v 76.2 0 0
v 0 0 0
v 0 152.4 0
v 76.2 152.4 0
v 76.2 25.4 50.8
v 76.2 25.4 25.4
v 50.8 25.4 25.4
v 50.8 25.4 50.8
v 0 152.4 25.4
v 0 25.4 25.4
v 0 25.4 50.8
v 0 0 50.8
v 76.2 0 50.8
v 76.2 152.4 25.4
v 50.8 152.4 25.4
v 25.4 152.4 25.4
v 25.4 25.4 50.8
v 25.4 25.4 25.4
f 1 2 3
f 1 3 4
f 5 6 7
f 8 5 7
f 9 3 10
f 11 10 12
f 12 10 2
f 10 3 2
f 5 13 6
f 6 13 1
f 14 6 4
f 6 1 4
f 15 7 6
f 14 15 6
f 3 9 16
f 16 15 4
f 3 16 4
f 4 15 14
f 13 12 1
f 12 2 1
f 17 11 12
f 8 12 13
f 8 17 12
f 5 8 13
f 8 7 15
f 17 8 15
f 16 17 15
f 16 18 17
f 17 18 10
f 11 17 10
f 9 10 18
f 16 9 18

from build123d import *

# Parameters (mm, degrees)
F0_W     = 76.2
F0_H     = 25.4
F1_DEPTH = 152.4
F2_W     = 25.4
F2_H     = 127
F3_DEPTH = 25.4
F5_DEPTH = 25.4


with BuildPart() as f1:
    # F0 (on Front) → F1 (new body)
    with BuildSketch(Plane.XZ):
        with Locations((38.1, 12.7)):
            Rectangle(F0_W, F0_H)
    extrude(amount=-F1_DEPTH)

    # F2 (on face) → F3 (join)
    with BuildSketch(Plane.XY.offset(25.4)):
        Polygon((0, 25.4), (0, 0), (76.2, 0), (76.2, 25.4), (50.8, 25.4), (25.4, 25.4), align=None)
        with Locations((38.1, 88.9)):
            Rectangle(F2_W, F2_H)
    extrude(amount=F3_DEPTH)

    # F4 (on face) → F5 (cut)
    with BuildSketch(Plane.YZ.offset(50.8)):
        Polygon((152.4, 50.8), (25.4, 50.8), (152.4, 25.4), align=None)
    extrude(amount=-F5_DEPTH, mode=Mode.SUBTRACT)


solid = f1.part
